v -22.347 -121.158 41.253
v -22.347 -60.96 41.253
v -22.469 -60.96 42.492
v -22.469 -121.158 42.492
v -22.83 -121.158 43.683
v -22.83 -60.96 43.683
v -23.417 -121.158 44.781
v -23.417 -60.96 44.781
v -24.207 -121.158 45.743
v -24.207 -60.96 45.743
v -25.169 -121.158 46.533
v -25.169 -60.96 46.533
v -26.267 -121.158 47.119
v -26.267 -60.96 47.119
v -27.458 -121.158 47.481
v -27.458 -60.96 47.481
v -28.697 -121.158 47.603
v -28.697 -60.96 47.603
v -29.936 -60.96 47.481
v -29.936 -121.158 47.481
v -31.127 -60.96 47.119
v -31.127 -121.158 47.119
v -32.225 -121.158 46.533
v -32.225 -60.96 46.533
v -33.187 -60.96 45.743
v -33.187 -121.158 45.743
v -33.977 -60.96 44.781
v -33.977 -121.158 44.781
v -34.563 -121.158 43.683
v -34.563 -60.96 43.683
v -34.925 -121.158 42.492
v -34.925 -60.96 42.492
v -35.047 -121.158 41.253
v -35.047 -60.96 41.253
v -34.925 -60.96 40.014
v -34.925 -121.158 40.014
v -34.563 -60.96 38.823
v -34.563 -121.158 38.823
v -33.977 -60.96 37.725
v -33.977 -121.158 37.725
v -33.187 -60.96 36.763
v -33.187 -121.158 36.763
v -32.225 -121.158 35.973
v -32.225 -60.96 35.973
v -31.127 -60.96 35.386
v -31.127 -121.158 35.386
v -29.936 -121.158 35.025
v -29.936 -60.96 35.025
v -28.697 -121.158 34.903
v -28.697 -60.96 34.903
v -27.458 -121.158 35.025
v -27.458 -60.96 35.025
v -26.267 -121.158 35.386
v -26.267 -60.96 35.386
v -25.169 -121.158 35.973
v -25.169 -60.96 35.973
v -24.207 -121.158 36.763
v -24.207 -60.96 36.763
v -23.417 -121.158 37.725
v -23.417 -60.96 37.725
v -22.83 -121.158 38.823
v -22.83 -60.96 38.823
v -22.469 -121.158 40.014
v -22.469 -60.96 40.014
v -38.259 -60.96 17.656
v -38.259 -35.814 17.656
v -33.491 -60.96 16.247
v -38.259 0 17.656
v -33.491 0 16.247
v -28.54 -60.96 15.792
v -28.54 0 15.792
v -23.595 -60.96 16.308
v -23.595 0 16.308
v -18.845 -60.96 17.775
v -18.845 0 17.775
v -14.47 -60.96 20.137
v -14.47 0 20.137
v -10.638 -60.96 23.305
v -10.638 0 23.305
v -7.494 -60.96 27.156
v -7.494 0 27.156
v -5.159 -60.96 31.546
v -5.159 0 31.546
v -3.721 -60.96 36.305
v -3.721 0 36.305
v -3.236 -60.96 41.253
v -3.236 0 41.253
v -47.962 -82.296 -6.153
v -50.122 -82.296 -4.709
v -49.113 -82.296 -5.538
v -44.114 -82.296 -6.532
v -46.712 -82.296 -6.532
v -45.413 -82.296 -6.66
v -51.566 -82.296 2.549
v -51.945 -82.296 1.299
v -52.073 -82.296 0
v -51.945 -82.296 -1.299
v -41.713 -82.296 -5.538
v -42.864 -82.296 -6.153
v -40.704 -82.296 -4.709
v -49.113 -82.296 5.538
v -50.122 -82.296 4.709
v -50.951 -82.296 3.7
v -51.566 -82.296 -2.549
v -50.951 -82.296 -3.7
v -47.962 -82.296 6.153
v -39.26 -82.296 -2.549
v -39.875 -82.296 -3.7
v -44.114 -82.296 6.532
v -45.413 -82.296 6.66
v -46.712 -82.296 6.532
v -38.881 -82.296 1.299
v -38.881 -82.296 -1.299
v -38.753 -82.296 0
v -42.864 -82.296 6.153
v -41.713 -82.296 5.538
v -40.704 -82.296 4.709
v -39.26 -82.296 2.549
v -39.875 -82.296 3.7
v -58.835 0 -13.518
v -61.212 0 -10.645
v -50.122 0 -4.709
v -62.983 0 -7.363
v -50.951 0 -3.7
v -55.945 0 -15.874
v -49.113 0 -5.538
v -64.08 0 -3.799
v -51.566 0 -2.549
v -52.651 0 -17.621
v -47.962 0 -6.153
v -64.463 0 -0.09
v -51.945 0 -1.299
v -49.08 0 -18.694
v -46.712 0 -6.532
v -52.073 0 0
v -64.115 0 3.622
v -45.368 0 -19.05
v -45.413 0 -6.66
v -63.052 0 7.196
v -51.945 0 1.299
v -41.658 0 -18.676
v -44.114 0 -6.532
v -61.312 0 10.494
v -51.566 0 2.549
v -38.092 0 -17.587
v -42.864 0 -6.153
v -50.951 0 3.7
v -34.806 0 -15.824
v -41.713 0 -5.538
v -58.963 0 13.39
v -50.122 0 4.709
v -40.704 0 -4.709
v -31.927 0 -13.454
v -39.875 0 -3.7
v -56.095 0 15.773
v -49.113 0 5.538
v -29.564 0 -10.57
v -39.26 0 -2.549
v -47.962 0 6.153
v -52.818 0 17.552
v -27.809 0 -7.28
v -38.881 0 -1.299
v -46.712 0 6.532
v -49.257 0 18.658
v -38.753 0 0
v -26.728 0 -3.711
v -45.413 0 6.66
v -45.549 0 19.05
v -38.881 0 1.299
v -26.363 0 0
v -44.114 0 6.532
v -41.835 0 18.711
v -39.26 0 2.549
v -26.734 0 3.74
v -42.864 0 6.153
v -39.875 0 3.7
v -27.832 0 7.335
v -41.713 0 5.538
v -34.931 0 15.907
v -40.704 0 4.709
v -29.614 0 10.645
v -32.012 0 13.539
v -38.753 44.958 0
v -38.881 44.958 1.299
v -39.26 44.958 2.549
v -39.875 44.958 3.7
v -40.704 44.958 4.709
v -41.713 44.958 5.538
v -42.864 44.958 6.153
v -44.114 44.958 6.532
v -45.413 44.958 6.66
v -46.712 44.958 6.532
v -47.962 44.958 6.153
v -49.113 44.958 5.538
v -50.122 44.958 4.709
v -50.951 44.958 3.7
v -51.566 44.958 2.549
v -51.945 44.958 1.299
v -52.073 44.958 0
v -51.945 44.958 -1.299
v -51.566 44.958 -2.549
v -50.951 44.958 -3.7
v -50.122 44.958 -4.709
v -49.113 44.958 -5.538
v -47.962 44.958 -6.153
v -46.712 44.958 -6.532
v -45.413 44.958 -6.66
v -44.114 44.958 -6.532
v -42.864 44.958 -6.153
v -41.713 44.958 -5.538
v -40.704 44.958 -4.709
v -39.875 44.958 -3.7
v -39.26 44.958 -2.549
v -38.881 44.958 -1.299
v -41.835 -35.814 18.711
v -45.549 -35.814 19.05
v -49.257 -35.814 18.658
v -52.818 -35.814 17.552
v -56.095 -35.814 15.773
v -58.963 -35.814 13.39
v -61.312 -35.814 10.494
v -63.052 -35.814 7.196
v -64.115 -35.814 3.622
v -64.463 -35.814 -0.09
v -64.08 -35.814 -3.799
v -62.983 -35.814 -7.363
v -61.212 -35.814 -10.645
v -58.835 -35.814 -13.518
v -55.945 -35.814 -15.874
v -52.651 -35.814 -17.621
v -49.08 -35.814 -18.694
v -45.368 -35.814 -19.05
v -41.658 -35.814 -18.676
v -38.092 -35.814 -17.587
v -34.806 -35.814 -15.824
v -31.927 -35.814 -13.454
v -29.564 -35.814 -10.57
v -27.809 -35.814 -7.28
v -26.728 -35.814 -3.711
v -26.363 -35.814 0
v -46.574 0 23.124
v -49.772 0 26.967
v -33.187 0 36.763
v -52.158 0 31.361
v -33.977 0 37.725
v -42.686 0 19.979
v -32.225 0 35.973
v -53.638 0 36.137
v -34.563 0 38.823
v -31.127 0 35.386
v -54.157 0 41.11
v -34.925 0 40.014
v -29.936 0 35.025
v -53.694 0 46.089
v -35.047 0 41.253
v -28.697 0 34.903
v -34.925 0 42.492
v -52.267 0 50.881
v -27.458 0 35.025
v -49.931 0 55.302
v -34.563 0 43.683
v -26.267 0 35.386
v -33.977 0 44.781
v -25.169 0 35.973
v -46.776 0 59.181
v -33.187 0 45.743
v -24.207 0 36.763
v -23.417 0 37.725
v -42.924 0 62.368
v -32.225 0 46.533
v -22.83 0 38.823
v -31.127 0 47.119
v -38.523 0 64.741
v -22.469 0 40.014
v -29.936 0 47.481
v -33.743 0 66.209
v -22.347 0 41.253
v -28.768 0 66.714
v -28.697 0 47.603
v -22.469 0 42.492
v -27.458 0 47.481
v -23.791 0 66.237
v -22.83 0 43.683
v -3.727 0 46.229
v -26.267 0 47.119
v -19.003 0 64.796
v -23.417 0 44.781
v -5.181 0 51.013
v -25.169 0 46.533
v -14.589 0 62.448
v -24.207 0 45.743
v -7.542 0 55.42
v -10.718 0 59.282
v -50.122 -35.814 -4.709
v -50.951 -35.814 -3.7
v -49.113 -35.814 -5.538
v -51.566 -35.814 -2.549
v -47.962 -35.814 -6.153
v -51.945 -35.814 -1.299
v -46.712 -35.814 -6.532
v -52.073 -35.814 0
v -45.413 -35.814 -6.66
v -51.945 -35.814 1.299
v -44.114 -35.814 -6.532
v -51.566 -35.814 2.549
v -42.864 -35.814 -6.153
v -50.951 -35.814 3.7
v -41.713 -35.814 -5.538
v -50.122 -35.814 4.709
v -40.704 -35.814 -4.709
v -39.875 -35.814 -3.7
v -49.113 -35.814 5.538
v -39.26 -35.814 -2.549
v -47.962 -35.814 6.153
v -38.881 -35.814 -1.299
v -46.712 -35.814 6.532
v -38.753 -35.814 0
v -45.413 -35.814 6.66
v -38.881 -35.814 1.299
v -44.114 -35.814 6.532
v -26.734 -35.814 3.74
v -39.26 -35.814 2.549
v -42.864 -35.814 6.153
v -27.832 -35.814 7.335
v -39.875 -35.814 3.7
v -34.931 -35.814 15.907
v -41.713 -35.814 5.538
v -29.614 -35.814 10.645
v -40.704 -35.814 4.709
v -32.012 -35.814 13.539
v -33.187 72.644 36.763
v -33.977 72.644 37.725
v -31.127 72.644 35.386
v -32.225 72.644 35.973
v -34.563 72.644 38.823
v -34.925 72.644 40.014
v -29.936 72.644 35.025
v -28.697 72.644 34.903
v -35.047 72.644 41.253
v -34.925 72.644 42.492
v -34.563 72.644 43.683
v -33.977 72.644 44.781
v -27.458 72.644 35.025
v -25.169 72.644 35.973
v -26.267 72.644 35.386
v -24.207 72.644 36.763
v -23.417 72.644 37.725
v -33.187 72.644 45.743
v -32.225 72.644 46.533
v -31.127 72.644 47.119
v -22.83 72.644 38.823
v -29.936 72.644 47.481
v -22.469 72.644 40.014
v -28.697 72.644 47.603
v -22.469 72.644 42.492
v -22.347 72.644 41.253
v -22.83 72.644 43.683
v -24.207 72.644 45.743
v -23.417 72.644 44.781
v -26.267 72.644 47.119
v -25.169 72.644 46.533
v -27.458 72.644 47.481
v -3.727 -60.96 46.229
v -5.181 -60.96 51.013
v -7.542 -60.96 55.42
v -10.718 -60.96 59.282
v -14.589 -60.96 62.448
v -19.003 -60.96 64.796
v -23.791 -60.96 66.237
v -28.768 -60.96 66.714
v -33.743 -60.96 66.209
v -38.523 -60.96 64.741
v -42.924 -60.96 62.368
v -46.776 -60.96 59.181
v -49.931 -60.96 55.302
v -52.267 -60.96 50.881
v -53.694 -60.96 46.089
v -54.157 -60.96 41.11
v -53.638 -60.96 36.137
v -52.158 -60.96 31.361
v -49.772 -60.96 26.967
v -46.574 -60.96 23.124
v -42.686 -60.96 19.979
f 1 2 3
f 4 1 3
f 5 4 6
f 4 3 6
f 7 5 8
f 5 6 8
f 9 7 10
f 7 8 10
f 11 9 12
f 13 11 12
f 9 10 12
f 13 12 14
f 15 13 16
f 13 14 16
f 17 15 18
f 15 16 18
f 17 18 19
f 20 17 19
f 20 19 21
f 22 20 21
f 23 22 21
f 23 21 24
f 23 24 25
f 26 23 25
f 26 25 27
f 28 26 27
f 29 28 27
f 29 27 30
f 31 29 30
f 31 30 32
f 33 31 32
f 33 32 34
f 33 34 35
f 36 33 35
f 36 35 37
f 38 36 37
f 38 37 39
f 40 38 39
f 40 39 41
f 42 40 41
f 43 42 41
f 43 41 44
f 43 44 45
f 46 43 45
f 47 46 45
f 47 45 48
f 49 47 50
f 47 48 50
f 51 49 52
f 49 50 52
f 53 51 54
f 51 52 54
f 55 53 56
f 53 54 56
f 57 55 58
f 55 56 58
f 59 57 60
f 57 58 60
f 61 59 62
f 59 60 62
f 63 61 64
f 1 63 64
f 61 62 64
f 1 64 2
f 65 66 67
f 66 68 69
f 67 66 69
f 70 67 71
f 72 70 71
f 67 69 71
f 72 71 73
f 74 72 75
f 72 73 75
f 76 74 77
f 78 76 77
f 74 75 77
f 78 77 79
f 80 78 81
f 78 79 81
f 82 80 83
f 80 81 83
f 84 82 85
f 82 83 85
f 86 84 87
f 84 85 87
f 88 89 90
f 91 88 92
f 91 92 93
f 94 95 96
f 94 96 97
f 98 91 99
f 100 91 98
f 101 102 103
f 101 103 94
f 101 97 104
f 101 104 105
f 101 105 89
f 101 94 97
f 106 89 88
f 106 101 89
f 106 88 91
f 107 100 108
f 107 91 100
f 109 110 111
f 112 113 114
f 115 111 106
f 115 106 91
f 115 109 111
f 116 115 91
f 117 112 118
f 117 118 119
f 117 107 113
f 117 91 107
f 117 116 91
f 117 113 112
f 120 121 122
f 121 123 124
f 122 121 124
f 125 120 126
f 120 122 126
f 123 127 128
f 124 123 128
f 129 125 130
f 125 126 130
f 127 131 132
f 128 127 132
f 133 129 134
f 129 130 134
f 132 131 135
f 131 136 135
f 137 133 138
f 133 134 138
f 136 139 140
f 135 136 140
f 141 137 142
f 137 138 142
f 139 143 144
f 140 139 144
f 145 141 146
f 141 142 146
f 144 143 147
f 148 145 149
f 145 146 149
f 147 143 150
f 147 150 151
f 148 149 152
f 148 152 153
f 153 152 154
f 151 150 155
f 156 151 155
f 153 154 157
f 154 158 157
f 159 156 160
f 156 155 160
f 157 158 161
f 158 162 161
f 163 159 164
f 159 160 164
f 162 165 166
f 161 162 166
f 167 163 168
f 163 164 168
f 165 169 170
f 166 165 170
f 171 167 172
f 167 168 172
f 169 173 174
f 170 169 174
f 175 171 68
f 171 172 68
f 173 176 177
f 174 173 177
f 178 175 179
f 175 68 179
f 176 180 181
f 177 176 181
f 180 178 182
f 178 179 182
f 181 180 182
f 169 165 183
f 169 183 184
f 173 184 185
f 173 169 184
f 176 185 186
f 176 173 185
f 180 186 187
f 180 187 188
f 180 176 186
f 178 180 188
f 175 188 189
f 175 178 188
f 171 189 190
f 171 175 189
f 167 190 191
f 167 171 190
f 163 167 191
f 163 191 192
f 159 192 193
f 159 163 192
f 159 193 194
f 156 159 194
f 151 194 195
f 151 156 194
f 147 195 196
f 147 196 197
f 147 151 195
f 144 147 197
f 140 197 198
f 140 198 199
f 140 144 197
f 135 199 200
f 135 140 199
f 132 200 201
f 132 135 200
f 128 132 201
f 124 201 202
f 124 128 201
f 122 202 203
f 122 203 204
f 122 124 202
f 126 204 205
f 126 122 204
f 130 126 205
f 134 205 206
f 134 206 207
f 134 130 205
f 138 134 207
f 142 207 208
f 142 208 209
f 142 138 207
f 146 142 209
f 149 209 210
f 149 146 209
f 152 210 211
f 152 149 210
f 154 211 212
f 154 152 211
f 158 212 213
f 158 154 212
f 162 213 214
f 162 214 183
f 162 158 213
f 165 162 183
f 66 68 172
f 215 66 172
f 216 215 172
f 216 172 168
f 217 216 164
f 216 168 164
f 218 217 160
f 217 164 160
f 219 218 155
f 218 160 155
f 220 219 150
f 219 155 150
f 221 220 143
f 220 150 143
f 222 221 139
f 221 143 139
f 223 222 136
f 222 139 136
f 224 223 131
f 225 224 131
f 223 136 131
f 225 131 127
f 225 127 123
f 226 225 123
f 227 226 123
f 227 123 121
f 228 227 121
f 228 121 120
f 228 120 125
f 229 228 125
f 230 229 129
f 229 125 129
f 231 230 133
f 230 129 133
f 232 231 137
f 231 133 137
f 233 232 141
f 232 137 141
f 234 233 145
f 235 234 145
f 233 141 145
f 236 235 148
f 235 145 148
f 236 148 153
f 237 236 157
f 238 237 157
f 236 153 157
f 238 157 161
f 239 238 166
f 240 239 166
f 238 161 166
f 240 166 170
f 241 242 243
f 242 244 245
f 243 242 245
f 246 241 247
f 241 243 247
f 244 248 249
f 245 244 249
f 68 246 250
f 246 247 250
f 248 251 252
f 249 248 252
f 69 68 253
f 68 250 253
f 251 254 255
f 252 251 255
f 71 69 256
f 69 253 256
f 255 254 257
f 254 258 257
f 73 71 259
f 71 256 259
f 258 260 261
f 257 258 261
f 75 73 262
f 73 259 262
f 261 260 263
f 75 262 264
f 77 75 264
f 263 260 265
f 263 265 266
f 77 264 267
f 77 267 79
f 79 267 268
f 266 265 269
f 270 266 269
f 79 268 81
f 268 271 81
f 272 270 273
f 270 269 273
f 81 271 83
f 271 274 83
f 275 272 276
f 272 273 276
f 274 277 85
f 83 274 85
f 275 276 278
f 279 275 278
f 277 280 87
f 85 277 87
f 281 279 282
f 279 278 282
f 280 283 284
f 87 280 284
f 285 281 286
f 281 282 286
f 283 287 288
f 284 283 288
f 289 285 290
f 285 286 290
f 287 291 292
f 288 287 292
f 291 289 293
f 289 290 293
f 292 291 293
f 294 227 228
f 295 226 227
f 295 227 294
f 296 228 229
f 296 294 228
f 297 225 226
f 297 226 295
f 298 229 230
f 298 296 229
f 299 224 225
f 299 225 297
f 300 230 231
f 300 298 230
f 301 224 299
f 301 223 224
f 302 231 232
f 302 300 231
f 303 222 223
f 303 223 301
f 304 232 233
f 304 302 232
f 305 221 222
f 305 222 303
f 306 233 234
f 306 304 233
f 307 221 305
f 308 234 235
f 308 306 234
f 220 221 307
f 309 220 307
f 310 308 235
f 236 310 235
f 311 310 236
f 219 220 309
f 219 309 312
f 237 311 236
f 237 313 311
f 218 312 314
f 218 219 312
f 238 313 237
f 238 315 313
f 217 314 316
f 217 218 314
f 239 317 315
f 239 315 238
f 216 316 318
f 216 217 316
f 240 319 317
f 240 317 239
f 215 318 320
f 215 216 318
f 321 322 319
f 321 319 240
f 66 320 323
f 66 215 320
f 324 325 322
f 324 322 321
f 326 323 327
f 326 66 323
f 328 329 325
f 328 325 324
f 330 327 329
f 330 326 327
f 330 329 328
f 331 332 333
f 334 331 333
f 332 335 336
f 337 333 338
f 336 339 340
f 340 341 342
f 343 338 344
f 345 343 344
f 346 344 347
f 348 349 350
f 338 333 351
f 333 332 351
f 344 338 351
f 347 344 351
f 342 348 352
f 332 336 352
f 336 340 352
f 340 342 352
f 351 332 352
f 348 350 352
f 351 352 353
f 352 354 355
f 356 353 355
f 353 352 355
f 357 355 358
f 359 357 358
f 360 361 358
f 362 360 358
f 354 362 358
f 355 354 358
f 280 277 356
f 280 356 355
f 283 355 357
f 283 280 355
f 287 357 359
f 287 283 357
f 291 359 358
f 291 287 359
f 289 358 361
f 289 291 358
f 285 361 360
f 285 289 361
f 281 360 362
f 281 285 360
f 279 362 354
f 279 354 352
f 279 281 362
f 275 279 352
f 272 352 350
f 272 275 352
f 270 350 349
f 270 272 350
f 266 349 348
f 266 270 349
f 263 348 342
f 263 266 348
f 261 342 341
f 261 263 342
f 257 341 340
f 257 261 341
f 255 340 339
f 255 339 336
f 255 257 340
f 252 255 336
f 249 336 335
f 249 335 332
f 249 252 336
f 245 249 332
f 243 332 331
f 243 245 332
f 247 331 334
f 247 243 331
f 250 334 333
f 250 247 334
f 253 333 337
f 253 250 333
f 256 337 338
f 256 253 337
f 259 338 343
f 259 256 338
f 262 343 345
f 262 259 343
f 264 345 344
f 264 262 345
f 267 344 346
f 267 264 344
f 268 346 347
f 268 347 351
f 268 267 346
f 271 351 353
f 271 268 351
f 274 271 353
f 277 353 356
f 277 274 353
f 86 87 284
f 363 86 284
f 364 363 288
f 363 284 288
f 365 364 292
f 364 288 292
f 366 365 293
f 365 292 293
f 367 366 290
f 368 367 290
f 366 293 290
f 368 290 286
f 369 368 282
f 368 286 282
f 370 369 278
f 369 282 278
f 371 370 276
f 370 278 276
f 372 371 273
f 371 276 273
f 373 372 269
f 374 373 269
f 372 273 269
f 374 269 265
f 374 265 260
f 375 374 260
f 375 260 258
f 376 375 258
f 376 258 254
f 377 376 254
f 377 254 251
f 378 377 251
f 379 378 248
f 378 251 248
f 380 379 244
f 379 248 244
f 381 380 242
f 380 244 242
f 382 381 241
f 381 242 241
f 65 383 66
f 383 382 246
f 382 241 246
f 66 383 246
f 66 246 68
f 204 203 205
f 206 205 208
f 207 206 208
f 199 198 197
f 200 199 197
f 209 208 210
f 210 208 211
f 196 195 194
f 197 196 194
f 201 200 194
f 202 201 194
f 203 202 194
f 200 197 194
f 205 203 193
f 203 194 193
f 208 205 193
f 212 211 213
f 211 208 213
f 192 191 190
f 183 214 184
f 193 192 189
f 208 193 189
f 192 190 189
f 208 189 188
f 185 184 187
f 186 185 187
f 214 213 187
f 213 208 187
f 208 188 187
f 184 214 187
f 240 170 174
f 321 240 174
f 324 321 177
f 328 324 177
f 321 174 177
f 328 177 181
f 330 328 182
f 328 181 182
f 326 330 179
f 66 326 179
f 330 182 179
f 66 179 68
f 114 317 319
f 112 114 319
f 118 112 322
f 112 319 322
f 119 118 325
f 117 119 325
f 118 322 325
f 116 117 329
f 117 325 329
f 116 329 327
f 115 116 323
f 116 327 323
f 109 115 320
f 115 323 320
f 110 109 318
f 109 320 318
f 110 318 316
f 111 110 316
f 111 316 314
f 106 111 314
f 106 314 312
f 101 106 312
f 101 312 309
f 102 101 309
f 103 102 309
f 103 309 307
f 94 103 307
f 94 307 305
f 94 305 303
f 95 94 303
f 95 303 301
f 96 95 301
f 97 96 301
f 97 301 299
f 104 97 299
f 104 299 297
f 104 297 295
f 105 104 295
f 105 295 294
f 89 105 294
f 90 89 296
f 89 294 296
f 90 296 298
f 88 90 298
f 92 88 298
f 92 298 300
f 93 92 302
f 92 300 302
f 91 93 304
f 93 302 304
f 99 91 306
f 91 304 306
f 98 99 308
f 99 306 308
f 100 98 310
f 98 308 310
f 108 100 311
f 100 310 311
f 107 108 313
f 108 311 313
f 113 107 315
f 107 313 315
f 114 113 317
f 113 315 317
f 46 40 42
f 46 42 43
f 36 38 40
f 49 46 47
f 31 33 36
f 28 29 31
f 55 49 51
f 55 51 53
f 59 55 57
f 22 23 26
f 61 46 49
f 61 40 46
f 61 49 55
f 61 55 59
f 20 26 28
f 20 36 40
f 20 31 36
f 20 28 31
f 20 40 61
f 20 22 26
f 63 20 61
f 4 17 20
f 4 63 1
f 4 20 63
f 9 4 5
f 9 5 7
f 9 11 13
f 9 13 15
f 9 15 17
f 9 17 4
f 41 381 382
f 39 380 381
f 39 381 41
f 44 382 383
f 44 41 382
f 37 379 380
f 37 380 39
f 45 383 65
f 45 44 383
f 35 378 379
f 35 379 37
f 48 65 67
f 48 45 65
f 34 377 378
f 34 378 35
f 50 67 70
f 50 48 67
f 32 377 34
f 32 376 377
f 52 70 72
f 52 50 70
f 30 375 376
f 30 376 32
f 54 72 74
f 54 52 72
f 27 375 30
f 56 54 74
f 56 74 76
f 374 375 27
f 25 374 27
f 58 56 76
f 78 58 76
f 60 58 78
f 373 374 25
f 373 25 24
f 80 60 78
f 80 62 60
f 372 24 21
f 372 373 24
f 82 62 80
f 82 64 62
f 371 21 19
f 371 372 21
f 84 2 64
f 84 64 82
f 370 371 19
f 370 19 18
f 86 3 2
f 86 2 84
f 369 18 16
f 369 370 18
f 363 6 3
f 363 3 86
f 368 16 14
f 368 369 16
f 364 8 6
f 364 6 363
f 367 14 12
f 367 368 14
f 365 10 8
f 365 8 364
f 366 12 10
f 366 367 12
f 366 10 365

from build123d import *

# Parameters (mm, degrees)
F0_R          = 6.660197
F1_DEPTH      = 35.814
F0_R_2        = 6.35
F2_DEPTH      = 60.96
F3_DEPTH      = 121.158
F3_DEPTH_BACK = 72.644
F4_DEPTH      = 82.296
F4_DEPTH_BACK = 44.958


with BuildPart() as f1:
    # F0 (on Front) → F1 (new body)
    with BuildSketch(Plane.XZ):
        with BuildLine():
            ThreePointArc((-38.25873, 17.655554), (-61.211629, -10.644557), (-26.363024, 0))
            ThreePointArc((-26.363024, 0), (-29.61442, 10.644557), (-38.25873, 17.655554))
        make_face()
        with Locations((-45.413024, 0)):
            Circle(F0_R, mode=Mode.SUBTRACT)
    extrude(amount=F1_DEPTH)

    # F0 (on Front) → F2 (join)
    with BuildSketch(Plane.XZ):
        with BuildLine():
            ThreePointArc((-3.235821, 41.252787), (-42.923582, 62.368147), (-38.25873, 17.655554))
            ThreePointArc((-38.25873, 17.655554), (-14.469974, 20.137428), (-3.235821, 41.252787))
        make_face()
        with Locations((-28.696778, 41.252787)):
            Circle(F0_R_2, mode=Mode.SUBTRACT)
    extrude(amount=F2_DEPTH)

    # F0 (on Front) → F3 (join, two sides)
    with BuildSketch(Plane.XZ) as f3_sk:
        with Locations((-28.696778, 41.252787)):
            Circle(F0_R_2)
    extrude(amount=F3_DEPTH)
    extrude(f3_sk.sketch, amount=-F3_DEPTH_BACK)

    # F0 (on Front) → F4 (join, two sides)
    with BuildSketch(Plane.XZ) as f4_sk:
        with Locations((-45.413024, 0)):
            Circle(F0_R)
    extrude(amount=F4_DEPTH)
    extrude(f4_sk.sketch, amount=-F4_DEPTH_BACK)


solid = f1.part
